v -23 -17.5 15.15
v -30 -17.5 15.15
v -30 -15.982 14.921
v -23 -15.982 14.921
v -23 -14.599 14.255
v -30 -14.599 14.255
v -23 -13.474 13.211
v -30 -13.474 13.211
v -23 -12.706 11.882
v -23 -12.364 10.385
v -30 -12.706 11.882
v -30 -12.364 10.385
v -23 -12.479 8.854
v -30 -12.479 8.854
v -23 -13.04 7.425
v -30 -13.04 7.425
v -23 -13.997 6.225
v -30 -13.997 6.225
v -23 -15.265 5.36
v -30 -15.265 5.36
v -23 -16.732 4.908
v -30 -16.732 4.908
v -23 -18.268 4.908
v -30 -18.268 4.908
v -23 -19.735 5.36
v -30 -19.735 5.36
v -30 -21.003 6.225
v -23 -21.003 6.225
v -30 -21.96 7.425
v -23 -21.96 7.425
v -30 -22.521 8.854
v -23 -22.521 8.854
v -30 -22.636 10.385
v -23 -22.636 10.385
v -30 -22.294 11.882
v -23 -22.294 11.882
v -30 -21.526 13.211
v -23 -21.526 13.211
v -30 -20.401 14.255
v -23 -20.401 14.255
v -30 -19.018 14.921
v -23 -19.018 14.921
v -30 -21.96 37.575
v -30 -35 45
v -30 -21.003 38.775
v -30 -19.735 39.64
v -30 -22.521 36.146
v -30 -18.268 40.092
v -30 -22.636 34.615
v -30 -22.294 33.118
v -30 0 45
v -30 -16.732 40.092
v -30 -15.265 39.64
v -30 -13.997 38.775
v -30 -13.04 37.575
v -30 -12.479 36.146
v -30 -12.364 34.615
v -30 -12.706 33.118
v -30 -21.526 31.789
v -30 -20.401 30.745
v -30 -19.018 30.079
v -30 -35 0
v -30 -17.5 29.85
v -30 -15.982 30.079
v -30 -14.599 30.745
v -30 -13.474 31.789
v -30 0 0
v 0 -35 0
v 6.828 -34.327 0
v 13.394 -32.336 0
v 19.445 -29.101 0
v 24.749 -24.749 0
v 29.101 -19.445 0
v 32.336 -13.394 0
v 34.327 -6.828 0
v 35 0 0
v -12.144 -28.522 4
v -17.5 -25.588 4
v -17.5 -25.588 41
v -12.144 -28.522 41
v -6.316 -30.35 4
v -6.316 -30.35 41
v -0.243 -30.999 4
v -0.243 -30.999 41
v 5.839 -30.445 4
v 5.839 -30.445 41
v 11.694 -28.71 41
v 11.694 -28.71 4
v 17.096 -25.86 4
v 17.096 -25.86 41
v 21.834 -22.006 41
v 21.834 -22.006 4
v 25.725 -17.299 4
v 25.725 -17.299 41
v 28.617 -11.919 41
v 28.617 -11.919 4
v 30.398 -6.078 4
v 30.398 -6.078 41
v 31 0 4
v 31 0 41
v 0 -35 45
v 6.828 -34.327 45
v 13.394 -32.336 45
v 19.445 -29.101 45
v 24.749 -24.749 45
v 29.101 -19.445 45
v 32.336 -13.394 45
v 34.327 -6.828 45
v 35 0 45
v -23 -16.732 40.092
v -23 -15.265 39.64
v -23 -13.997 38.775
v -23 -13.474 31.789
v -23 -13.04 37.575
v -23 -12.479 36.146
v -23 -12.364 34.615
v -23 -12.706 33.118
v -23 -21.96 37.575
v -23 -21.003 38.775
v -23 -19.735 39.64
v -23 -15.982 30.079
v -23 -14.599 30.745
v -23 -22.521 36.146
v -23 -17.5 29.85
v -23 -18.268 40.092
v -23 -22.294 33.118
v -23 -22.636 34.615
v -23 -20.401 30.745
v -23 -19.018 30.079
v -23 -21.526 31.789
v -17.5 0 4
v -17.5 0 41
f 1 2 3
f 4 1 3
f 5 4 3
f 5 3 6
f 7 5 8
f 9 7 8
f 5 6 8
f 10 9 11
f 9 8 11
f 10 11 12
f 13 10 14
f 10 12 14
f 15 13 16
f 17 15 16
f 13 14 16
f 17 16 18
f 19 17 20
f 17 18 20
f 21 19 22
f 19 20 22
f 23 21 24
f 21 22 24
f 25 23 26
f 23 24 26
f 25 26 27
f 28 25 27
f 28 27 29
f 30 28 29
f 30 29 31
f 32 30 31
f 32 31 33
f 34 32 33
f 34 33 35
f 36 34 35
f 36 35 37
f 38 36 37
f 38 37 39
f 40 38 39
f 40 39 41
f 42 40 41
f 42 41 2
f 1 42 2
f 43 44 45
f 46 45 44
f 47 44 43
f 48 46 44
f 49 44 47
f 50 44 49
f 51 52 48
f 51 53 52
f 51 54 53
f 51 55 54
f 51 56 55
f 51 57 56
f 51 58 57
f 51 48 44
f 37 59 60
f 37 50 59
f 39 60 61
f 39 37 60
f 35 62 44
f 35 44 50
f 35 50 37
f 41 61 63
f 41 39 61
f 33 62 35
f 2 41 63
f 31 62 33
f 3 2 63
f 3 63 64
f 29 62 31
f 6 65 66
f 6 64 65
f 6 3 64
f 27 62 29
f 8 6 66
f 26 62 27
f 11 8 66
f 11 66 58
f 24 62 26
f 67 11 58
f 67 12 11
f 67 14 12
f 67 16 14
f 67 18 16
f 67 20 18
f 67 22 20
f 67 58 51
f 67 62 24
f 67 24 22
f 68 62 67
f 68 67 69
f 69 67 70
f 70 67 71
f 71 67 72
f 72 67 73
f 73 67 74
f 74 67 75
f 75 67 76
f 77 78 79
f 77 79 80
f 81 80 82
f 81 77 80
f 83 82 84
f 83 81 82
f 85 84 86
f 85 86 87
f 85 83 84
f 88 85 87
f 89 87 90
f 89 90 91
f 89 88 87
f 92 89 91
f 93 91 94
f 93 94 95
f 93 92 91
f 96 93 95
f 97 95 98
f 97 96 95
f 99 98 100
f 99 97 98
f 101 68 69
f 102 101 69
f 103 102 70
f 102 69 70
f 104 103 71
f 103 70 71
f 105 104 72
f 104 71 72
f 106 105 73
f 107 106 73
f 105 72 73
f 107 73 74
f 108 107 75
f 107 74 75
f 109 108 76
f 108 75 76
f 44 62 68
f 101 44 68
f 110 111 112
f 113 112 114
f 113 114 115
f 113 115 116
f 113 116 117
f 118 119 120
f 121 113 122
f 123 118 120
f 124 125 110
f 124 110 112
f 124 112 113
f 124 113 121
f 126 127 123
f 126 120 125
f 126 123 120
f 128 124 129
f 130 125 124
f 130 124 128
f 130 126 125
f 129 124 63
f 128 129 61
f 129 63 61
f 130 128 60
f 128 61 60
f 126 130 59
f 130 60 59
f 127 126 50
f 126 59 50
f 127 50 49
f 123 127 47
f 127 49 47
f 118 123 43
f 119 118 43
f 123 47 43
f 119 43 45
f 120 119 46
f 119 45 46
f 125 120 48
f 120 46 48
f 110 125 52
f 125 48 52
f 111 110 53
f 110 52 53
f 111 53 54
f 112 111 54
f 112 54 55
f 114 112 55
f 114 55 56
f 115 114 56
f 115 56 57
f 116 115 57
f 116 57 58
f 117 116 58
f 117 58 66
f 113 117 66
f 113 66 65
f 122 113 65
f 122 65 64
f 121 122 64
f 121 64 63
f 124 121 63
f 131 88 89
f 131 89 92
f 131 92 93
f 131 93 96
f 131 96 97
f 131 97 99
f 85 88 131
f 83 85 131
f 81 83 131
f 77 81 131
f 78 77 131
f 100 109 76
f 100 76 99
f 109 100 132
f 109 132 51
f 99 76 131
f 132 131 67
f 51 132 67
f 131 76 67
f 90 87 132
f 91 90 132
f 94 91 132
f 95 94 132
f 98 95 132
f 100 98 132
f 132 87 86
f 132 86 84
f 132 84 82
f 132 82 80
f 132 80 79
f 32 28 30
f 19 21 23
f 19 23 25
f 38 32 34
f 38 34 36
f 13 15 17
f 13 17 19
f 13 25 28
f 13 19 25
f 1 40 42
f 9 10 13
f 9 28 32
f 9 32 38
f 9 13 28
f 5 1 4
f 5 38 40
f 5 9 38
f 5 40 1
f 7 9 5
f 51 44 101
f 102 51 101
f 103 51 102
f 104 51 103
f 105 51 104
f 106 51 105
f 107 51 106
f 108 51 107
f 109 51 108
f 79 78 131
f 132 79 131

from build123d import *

# Parameters (mm, degrees)
BOSS_EXTRUDE1_DEPTH = 45
SKETCH2_W           = 31
SKETCH2_H           = 37
BOSS_EXTRUDE3_START = -45
BOSS_EXTRUDE3_DEPTH = 45
SKETCH4_R           = 5.15
CUT_EXTRUDE1_DEPTH  = 12
SKETCH5_W           = 5
SKETCH5_H           = 35
CUT_EXTRUDE2_DEPTH  = 67.895440801


with BuildPart() as part:
    # Sketch1 → Boss-Extrude1 (new body)
    with BuildSketch(Plane.XY):
        with BuildLine():
            Line((35, 0), (-35, 0))
            ThreePointArc((-35, 0), (0, -35), (35, 0))
        make_face()
    extrude(amount=BOSS_EXTRUDE1_DEPTH)

    # Sketch2 → Cut-Revolve1 (revolve, cut)
    with BuildSketch(Plane(origin=(0, 0, 0), x_dir=(1, 0, 0), z_dir=(0, 1, 0))):
        with Locations((-15.5, -22.5)):
            Rectangle(SKETCH2_W, SKETCH2_H)
    revolve(axis=Axis((0, 0, 0), (0, 0, 1)), mode=Mode.SUBTRACT)

    # Sketch3 → Boss-Extrude3 (add)
    with BuildSketch(Plane.XY.offset(45).offset(BOSS_EXTRUDE3_START)):
        with BuildLine():
            Line((-17.5, -30.310889132), (-17.5, 0))
            Line((-17.5, 0), (-35, 0))
            Line((-35, 0), (-35, -35))
            Line((-35, -35), (0, -35))
            ThreePointArc((0, -35), (-9.058666579, -33.80740392), (-17.5, -30.310889132))
        make_face()
    extrude(amount=BOSS_EXTRUDE3_DEPTH)

    # Sketch4 → Cut-Extrude1 (cut)
    with BuildSketch(Plane.ZY.offset(35)):
        with Locations((10, -17.5)):
            Circle(SKETCH4_R)
        with Locations((35, -17.5)):
            Circle(SKETCH4_R)
    extrude(amount=-CUT_EXTRUDE1_DEPTH, mode=Mode.SUBTRACT)

    # Sketch5 → Cut-Extrude2 (cut, through all)
    with BuildSketch(Plane(origin=(0, 0, 0), x_dir=(-1, 0, 0), z_dir=(0, 0, -1))):
        with Locations((32.5, -17.5)):
            Rectangle(SKETCH5_W, SKETCH5_H)
    extrude(amount=-CUT_EXTRUDE2_DEPTH, mode=Mode.SUBTRACT)


solid = part.part
